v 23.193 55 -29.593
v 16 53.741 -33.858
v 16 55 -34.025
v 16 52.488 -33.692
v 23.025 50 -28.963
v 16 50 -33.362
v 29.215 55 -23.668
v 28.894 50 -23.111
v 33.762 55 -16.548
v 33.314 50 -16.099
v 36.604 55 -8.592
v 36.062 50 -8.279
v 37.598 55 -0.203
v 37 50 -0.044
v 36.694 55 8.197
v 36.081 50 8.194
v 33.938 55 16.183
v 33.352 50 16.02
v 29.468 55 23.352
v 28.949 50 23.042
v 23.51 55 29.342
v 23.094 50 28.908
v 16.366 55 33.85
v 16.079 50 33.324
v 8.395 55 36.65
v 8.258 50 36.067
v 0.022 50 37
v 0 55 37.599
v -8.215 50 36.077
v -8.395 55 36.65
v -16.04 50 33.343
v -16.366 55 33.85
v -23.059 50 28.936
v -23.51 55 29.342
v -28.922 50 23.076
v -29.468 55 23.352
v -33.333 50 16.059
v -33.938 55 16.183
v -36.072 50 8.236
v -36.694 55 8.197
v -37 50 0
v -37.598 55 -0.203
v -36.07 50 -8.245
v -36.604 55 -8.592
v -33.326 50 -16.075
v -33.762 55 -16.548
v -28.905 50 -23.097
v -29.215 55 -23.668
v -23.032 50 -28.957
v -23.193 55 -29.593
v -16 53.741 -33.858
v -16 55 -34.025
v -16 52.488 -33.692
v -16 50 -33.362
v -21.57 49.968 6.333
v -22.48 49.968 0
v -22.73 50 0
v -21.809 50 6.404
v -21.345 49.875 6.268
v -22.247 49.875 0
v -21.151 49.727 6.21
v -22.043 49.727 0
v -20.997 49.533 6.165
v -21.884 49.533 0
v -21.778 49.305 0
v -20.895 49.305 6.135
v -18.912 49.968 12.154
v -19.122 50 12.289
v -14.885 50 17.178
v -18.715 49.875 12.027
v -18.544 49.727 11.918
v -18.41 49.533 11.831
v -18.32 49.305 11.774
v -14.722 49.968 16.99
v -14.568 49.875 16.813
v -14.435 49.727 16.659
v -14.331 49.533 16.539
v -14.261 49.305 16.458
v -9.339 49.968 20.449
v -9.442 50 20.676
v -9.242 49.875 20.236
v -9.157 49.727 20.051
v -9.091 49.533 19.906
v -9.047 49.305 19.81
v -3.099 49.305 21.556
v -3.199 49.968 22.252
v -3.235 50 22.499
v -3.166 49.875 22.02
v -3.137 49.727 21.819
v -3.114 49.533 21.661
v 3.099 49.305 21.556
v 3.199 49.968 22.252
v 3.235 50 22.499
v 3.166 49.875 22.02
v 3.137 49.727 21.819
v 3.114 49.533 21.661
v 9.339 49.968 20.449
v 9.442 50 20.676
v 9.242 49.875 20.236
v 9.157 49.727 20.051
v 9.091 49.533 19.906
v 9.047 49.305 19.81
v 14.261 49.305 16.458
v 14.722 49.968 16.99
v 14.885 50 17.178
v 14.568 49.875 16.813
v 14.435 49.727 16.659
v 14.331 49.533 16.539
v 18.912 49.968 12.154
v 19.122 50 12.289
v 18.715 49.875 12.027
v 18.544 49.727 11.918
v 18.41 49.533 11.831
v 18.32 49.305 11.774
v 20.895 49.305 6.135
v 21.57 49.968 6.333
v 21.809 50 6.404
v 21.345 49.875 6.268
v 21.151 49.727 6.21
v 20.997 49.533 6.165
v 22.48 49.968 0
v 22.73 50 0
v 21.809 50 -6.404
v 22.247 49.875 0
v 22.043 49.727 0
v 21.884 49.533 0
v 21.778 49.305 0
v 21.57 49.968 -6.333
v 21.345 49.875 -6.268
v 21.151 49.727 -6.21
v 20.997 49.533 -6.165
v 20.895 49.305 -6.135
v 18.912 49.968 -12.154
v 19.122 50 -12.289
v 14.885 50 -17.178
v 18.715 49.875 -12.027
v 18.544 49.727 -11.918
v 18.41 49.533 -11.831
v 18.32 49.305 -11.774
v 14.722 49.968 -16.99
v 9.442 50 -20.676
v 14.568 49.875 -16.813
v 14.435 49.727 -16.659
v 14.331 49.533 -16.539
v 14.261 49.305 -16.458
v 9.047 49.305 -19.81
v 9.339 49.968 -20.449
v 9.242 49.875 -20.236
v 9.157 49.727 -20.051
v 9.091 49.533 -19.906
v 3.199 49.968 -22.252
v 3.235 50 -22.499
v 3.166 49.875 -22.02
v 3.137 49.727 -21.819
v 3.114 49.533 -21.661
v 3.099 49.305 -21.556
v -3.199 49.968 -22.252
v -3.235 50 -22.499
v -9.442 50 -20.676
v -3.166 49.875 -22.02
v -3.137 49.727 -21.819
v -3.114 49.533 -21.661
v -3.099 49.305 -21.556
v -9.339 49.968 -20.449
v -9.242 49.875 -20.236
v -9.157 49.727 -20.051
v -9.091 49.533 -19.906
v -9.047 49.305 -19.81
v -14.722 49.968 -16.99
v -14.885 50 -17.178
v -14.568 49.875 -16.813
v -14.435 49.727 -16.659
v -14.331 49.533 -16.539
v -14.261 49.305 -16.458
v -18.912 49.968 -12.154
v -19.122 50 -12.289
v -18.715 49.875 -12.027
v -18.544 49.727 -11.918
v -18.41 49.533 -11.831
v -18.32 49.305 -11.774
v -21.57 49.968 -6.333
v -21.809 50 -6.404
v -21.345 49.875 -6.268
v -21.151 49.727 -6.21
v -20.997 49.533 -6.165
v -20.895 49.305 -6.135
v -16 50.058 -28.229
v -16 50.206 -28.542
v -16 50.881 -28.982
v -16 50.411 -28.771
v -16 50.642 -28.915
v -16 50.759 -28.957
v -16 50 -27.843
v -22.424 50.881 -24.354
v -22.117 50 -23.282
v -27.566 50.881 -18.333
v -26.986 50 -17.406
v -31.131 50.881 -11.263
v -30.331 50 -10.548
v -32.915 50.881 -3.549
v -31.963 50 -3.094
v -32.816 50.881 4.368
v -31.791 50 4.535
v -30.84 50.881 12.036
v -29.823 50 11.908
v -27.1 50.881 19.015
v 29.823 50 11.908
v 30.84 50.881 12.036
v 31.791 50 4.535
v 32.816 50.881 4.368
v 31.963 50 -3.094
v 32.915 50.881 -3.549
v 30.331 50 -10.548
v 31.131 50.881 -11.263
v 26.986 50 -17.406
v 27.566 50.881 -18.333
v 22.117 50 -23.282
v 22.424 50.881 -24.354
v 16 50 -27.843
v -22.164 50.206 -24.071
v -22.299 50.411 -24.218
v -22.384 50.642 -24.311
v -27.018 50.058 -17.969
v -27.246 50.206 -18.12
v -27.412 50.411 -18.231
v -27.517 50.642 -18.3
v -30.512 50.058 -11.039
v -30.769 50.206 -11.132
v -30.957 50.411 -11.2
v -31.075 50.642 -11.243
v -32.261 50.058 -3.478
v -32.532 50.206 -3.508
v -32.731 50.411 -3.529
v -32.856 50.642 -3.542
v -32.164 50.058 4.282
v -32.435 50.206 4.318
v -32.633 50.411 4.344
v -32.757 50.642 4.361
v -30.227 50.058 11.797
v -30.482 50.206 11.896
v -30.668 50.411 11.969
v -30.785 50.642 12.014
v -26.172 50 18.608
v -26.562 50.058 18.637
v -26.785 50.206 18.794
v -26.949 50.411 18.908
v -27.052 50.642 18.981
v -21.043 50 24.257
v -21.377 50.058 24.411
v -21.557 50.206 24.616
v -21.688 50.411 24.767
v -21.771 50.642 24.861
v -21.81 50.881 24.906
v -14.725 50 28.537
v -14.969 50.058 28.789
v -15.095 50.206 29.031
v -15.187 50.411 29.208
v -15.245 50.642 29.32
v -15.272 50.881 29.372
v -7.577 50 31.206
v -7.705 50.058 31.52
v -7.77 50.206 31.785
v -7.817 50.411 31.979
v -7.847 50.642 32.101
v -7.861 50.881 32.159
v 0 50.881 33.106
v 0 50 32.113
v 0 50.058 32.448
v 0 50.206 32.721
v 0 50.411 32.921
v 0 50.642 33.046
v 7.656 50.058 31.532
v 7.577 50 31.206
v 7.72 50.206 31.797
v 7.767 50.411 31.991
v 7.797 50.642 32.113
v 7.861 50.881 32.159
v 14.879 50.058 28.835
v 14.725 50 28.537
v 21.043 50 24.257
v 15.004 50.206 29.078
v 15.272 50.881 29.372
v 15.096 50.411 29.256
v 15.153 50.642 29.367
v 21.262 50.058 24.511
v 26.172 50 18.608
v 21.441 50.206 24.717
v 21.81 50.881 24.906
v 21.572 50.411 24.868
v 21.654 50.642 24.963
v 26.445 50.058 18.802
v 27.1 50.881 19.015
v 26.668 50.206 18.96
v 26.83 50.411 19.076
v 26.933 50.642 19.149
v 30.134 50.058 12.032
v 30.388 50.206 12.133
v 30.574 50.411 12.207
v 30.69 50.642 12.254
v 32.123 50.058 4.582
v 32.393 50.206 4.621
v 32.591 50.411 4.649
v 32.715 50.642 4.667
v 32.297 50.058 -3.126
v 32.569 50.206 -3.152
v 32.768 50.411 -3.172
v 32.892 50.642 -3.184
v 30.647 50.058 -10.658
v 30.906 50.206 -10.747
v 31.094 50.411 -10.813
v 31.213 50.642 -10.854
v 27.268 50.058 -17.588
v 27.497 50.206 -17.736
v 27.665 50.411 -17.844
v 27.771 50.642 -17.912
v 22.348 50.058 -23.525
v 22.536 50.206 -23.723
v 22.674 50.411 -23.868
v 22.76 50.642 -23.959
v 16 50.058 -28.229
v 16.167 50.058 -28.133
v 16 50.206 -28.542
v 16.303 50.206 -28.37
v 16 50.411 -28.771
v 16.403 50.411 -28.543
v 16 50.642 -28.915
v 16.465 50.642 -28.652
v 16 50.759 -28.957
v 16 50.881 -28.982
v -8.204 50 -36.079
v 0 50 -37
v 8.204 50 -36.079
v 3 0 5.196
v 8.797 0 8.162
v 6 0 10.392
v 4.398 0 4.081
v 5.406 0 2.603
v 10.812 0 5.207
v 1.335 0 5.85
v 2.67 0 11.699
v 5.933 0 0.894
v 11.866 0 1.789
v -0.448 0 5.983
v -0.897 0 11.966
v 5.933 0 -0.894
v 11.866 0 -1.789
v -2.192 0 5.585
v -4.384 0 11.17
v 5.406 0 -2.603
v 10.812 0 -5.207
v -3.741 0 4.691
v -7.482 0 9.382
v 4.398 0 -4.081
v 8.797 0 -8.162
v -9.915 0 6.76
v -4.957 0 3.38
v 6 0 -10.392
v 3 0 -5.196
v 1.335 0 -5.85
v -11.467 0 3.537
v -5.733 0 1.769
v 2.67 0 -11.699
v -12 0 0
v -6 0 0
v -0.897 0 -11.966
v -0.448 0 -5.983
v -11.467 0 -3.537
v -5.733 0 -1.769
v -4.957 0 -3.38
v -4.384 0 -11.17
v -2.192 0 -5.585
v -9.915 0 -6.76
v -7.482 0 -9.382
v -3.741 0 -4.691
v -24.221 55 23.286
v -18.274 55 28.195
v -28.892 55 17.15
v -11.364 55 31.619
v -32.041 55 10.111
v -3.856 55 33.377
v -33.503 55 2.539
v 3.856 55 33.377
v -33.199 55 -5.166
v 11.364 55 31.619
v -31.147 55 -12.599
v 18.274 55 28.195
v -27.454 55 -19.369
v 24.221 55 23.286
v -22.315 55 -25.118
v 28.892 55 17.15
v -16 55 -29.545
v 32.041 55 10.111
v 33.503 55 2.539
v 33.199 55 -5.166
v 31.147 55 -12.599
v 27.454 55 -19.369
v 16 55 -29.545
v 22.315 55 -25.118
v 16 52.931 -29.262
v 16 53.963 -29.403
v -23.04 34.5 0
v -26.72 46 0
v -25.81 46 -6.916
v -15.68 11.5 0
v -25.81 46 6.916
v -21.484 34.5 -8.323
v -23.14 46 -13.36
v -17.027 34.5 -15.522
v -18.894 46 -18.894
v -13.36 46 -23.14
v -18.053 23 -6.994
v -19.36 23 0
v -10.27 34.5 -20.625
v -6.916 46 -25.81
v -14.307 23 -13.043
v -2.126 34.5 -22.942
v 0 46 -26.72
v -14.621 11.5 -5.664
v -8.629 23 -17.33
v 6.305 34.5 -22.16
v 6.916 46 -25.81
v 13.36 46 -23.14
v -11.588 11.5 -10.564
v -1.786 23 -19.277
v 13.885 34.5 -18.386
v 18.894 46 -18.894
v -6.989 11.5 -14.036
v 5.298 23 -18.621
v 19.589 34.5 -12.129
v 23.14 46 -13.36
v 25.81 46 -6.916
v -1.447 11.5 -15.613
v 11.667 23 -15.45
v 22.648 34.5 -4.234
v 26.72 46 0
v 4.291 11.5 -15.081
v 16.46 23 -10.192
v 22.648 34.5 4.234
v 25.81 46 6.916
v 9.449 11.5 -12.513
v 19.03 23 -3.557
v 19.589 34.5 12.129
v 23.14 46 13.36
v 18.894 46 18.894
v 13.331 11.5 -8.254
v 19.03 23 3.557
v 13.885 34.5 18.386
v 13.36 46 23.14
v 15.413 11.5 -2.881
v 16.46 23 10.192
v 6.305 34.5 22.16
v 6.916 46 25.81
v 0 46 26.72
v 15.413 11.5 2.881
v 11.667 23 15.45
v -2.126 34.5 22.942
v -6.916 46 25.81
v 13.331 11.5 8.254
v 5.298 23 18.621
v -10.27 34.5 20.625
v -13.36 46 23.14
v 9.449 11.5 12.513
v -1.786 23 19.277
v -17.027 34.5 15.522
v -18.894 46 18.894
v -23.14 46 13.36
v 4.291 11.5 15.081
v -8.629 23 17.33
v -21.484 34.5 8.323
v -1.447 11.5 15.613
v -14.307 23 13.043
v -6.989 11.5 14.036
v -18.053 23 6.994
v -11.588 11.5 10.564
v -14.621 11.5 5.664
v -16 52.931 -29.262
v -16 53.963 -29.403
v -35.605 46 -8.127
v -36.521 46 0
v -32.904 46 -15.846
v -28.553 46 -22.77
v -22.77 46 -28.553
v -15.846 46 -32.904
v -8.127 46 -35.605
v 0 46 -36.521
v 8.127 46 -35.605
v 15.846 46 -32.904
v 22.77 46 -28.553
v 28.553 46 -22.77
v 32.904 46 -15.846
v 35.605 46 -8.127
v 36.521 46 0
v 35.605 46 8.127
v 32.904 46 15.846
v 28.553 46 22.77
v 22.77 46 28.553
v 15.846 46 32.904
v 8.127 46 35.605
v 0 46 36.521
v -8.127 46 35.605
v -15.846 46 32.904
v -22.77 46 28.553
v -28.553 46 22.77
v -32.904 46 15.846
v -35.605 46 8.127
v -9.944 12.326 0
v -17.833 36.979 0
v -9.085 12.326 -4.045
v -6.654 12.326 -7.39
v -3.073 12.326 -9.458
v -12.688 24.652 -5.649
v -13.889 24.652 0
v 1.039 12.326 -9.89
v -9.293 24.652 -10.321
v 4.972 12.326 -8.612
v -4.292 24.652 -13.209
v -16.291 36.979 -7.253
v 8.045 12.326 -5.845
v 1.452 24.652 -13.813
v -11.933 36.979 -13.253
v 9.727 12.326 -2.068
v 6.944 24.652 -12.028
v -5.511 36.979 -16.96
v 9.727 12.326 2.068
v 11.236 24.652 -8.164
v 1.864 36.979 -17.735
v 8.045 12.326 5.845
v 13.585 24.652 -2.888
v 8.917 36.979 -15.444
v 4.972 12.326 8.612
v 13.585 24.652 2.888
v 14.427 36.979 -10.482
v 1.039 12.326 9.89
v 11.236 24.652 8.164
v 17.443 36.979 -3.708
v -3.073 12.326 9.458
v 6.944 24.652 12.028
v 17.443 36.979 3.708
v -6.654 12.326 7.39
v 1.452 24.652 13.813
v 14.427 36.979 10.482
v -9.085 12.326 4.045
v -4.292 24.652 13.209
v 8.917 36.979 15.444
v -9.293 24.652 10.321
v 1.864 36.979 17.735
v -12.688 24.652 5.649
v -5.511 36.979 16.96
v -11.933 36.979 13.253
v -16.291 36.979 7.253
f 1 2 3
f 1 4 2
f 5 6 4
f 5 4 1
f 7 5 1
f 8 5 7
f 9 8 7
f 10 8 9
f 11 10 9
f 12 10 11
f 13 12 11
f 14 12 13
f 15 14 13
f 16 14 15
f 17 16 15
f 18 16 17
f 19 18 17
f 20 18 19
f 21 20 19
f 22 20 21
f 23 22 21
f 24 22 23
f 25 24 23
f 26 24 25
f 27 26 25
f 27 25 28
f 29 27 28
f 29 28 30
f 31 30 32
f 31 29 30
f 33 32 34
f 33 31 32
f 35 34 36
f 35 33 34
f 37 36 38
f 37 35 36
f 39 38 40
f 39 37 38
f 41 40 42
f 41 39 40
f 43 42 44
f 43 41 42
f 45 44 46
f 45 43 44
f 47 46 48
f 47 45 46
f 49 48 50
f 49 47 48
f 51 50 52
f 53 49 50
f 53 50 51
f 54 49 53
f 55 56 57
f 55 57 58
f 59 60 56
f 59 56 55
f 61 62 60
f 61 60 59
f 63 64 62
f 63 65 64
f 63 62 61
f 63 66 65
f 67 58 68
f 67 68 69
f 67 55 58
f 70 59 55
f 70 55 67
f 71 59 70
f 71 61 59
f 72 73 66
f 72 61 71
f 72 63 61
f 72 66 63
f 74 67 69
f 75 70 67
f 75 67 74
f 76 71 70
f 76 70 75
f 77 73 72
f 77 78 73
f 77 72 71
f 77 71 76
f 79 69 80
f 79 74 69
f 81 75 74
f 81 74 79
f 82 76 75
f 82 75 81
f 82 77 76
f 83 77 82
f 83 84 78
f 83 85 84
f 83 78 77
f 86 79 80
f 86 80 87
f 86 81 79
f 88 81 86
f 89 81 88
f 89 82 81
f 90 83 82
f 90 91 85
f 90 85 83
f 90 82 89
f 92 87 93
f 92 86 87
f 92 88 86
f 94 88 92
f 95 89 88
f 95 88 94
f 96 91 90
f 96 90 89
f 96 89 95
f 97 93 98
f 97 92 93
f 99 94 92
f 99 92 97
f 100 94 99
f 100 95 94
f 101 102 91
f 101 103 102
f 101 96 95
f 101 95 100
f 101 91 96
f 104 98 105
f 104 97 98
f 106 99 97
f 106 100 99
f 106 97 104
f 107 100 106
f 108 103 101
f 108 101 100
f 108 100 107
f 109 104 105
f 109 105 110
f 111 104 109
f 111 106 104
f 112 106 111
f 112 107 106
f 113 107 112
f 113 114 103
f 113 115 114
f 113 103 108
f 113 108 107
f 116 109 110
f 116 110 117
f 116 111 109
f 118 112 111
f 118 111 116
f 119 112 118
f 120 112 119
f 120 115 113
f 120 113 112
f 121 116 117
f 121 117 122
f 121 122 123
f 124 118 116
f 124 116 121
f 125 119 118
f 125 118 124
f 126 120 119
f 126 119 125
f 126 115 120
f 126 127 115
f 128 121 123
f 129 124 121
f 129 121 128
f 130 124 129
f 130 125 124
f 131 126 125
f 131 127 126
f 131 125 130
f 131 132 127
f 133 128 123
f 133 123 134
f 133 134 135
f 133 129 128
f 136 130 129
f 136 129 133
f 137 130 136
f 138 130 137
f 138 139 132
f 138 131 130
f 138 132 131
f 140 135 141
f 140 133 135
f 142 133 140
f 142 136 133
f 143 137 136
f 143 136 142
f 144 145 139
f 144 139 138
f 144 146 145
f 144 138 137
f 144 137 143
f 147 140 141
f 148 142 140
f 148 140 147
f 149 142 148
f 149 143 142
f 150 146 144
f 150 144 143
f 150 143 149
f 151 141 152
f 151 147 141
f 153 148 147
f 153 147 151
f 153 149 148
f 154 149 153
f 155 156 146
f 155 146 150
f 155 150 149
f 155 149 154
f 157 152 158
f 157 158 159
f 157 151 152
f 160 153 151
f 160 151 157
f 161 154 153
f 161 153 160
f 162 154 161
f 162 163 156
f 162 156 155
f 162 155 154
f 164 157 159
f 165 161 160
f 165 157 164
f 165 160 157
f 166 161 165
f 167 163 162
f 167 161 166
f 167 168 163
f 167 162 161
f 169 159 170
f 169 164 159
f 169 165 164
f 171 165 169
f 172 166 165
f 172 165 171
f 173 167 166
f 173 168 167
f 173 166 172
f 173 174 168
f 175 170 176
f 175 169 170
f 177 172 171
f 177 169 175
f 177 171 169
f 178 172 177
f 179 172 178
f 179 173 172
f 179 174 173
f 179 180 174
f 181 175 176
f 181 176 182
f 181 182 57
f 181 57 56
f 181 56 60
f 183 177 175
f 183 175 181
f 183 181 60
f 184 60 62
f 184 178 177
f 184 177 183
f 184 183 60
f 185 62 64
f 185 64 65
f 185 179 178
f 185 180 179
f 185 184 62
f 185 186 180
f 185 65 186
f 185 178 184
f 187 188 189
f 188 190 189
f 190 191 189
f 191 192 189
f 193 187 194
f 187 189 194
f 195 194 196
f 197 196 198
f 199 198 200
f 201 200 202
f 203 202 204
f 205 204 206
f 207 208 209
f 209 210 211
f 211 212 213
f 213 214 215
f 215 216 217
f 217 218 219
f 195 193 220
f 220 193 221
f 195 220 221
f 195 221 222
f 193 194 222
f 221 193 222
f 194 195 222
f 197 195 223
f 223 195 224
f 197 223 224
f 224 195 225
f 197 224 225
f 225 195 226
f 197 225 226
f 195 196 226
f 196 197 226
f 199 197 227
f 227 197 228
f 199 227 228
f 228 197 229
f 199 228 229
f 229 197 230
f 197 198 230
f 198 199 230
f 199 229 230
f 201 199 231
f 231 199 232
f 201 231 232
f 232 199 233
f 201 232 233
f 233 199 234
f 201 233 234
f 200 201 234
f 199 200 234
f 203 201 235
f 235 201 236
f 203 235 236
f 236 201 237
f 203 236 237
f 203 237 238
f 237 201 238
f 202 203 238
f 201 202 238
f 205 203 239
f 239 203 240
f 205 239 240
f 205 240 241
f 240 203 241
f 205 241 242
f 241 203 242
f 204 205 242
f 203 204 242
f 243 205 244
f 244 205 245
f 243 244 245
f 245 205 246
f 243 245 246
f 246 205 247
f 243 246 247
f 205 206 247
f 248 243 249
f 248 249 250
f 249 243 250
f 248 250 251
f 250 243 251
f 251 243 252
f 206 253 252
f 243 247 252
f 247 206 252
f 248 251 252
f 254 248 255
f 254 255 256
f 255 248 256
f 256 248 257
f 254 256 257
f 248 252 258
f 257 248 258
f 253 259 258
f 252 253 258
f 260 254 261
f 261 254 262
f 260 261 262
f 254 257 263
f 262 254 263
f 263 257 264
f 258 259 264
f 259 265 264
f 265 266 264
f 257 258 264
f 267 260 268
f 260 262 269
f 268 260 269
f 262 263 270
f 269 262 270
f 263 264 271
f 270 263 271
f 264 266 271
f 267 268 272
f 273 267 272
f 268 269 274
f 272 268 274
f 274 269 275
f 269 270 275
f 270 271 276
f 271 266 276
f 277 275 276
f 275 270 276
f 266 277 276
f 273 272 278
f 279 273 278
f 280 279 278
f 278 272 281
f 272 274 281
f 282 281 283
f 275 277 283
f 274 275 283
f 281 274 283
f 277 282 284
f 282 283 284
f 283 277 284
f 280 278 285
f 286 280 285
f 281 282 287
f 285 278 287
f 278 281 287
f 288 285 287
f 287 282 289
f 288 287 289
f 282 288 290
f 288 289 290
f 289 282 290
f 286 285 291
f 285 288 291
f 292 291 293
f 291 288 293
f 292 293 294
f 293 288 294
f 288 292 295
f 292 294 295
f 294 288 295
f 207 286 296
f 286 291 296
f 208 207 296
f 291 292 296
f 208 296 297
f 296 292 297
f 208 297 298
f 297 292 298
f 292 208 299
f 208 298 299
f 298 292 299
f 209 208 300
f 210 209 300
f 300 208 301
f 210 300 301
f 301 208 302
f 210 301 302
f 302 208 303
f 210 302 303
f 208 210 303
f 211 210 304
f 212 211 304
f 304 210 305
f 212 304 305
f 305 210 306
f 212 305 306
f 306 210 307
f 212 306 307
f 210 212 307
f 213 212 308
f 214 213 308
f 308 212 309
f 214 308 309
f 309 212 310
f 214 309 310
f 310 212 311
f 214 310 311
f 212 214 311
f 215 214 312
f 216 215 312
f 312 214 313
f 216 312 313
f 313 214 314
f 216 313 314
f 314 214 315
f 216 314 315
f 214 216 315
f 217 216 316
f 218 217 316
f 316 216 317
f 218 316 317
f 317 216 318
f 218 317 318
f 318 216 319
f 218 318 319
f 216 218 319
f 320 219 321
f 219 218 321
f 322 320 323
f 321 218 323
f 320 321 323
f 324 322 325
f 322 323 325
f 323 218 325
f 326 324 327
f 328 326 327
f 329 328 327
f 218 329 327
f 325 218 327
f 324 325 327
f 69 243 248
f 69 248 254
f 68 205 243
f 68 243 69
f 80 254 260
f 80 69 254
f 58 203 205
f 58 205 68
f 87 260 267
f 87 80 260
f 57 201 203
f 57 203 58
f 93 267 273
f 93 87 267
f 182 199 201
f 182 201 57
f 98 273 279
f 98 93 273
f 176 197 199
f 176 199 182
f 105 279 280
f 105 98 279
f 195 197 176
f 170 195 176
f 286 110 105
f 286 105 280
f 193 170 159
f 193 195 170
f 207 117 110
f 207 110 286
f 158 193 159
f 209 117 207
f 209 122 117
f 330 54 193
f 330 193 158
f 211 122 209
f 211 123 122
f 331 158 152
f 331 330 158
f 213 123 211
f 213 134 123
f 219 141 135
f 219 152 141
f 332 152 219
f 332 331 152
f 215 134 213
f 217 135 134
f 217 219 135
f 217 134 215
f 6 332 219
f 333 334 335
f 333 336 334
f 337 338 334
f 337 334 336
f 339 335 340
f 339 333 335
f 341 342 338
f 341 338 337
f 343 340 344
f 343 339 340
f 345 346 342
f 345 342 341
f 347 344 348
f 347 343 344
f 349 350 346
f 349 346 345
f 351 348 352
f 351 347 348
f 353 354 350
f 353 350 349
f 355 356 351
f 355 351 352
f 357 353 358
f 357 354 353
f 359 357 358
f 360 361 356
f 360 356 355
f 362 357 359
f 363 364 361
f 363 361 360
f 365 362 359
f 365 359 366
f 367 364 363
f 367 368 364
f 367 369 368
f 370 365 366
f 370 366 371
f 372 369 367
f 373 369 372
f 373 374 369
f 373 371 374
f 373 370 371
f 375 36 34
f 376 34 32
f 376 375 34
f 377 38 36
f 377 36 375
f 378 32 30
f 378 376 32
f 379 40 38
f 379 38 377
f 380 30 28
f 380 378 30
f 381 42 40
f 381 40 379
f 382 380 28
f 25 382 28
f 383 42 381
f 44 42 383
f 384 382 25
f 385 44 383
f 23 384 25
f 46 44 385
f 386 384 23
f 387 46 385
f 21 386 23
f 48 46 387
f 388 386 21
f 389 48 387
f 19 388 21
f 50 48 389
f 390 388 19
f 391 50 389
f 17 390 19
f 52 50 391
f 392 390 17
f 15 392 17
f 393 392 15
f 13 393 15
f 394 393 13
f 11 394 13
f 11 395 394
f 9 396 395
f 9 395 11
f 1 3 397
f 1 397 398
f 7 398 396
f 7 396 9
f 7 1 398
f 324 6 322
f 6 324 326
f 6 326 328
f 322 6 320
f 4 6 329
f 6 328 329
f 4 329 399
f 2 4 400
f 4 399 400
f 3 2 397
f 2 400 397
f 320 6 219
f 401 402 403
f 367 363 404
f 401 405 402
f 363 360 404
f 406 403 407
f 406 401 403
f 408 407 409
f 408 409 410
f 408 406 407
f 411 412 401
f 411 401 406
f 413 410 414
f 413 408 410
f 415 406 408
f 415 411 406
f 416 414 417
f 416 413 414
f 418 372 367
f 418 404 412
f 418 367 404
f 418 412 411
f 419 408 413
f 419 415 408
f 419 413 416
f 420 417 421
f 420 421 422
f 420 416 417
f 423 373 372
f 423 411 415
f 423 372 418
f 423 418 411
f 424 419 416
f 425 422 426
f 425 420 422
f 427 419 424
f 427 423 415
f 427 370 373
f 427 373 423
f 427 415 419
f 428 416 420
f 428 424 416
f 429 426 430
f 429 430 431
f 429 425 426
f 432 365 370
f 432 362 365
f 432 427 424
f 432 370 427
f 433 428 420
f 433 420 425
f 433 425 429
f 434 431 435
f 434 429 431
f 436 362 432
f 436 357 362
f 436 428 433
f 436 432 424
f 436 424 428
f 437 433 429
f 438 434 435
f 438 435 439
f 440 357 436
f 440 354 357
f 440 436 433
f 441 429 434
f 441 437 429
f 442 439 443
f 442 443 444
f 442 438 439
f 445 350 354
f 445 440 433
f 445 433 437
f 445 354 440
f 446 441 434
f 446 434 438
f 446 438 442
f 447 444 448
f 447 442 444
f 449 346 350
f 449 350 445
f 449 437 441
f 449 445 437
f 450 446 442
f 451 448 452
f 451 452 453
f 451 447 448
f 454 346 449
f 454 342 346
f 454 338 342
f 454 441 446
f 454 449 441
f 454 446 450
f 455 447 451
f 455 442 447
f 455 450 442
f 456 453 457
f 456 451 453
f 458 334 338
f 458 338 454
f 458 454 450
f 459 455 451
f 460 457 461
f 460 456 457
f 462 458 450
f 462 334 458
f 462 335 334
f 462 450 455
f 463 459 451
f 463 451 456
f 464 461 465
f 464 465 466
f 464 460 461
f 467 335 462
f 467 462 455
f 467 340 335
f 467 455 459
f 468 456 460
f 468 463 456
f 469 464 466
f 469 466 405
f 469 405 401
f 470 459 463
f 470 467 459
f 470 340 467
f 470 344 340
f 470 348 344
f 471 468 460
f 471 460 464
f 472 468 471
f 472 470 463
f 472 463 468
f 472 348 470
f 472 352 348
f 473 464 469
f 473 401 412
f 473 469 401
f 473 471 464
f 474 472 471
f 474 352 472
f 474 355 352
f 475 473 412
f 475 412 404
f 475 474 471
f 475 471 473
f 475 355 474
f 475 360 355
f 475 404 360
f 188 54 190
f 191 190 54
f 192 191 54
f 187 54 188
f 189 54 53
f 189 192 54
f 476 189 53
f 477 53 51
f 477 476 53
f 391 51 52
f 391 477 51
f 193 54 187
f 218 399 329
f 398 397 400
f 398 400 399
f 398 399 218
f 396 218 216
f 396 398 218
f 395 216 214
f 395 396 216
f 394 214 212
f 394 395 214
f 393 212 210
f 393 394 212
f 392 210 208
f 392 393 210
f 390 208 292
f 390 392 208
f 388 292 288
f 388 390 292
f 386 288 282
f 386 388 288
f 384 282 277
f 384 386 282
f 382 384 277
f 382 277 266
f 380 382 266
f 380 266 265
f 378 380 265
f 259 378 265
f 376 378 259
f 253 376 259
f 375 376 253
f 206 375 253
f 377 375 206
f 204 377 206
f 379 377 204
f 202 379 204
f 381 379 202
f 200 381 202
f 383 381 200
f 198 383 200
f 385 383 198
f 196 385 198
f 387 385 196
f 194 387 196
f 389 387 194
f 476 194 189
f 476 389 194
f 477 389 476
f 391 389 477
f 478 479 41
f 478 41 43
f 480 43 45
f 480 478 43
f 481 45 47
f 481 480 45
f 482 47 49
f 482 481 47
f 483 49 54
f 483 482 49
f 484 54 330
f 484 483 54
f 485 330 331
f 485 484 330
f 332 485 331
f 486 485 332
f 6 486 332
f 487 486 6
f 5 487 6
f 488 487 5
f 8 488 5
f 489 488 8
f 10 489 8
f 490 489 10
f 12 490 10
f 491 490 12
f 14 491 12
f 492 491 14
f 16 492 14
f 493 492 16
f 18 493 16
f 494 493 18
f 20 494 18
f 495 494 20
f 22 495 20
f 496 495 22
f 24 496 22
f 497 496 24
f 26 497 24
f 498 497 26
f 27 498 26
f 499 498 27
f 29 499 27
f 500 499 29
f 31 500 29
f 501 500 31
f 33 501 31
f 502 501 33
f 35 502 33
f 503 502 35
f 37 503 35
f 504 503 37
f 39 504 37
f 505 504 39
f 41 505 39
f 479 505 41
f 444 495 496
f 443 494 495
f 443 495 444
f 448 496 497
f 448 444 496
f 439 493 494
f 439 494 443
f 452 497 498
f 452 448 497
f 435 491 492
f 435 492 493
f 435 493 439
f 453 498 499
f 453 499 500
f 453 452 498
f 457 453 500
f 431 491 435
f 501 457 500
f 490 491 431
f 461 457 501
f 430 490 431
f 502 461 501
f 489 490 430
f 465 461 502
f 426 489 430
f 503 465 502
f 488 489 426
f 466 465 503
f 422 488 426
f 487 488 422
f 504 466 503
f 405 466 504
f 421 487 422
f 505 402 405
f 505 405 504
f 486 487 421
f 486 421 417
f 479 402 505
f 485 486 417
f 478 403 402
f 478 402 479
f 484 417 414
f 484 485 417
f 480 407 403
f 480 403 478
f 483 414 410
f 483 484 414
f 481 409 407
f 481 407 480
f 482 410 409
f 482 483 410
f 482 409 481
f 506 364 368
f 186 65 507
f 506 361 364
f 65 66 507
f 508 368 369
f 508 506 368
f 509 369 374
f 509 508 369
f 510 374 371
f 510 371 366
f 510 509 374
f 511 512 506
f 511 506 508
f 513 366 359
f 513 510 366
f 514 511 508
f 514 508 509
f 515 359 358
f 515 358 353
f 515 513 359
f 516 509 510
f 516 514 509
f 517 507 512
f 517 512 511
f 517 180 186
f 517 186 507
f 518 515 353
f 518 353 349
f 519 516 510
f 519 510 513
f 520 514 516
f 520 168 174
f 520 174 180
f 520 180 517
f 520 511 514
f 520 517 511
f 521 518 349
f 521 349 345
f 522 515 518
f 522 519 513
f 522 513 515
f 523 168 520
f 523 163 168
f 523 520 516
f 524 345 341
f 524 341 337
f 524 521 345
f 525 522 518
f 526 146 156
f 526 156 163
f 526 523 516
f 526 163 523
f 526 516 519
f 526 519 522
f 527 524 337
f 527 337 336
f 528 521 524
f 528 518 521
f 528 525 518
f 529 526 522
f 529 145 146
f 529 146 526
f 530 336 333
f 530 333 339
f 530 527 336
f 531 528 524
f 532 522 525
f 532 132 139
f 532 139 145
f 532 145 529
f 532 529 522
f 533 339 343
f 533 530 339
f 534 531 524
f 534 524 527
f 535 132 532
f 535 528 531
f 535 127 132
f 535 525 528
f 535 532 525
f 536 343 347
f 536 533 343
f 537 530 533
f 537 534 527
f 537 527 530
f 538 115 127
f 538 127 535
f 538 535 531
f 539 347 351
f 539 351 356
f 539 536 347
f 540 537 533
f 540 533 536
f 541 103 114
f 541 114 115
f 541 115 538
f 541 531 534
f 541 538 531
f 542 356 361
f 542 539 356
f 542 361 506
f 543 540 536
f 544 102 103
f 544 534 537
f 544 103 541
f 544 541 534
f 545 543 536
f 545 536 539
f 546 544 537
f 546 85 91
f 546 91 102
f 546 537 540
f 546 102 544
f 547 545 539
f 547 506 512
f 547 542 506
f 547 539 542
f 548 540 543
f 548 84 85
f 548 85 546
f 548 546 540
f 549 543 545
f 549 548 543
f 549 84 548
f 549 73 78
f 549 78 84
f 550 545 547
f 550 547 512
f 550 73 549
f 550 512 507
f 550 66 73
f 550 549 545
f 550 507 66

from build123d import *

# Parameters (mm, degrees)
SKETCH2_W          = 32
SKETCH2_H          = 5
CUT_EXTRUDE2_DEPTH = 77.50062169
FILLET1_R          = 1
FILLET2_R          = 1


with BuildPart() as part:
    # Sketch1 → Revolve1 (revolve)
    with BuildSketch(Plane.XY):
        Polygon((-12, 0), (-6, 0), (-22, 50), (-22, 46), (-26.72, 46), align=None)
        Polygon((-36.520930233, 46), (-26.72, 46), (-28, 50), (-33, 50), (-37, 50), align=None)
        Polygon((-22, 46), (-22, 50), (-28, 50), (-26.72, 46), align=None)
        Polygon((-37, 50), (-33, 50), (-33.598837209, 55), (-37.598837209, 55), align=None)
    revolve(axis=Axis((0, 50, 0), (0, -1, 0)))

    # Sketch2 → Cut-Extrude2 (cut, through all)
    with BuildSketch(Plane.XY):
        with Locations((0, 52.5)):
            Rectangle(SKETCH2_W, SKETCH2_H)
    extrude(amount=-CUT_EXTRUDE2_DEPTH, mode=Mode.SUBTRACT)

    # Fillet1
    fillet1_edges = [part.edges().sort_by_distance(p)[0] for p in [
        (0, 50, 33),
    ]]
    fillet(fillet1_edges, radius=FILLET1_R)

    # Fillet2
    fillet2_edges = [part.edges().sort_by_distance(p)[0] for p in [
        (22, 50, 0),
    ]]
    fillet(fillet2_edges, radius=FILLET2_R)


solid = part.part
